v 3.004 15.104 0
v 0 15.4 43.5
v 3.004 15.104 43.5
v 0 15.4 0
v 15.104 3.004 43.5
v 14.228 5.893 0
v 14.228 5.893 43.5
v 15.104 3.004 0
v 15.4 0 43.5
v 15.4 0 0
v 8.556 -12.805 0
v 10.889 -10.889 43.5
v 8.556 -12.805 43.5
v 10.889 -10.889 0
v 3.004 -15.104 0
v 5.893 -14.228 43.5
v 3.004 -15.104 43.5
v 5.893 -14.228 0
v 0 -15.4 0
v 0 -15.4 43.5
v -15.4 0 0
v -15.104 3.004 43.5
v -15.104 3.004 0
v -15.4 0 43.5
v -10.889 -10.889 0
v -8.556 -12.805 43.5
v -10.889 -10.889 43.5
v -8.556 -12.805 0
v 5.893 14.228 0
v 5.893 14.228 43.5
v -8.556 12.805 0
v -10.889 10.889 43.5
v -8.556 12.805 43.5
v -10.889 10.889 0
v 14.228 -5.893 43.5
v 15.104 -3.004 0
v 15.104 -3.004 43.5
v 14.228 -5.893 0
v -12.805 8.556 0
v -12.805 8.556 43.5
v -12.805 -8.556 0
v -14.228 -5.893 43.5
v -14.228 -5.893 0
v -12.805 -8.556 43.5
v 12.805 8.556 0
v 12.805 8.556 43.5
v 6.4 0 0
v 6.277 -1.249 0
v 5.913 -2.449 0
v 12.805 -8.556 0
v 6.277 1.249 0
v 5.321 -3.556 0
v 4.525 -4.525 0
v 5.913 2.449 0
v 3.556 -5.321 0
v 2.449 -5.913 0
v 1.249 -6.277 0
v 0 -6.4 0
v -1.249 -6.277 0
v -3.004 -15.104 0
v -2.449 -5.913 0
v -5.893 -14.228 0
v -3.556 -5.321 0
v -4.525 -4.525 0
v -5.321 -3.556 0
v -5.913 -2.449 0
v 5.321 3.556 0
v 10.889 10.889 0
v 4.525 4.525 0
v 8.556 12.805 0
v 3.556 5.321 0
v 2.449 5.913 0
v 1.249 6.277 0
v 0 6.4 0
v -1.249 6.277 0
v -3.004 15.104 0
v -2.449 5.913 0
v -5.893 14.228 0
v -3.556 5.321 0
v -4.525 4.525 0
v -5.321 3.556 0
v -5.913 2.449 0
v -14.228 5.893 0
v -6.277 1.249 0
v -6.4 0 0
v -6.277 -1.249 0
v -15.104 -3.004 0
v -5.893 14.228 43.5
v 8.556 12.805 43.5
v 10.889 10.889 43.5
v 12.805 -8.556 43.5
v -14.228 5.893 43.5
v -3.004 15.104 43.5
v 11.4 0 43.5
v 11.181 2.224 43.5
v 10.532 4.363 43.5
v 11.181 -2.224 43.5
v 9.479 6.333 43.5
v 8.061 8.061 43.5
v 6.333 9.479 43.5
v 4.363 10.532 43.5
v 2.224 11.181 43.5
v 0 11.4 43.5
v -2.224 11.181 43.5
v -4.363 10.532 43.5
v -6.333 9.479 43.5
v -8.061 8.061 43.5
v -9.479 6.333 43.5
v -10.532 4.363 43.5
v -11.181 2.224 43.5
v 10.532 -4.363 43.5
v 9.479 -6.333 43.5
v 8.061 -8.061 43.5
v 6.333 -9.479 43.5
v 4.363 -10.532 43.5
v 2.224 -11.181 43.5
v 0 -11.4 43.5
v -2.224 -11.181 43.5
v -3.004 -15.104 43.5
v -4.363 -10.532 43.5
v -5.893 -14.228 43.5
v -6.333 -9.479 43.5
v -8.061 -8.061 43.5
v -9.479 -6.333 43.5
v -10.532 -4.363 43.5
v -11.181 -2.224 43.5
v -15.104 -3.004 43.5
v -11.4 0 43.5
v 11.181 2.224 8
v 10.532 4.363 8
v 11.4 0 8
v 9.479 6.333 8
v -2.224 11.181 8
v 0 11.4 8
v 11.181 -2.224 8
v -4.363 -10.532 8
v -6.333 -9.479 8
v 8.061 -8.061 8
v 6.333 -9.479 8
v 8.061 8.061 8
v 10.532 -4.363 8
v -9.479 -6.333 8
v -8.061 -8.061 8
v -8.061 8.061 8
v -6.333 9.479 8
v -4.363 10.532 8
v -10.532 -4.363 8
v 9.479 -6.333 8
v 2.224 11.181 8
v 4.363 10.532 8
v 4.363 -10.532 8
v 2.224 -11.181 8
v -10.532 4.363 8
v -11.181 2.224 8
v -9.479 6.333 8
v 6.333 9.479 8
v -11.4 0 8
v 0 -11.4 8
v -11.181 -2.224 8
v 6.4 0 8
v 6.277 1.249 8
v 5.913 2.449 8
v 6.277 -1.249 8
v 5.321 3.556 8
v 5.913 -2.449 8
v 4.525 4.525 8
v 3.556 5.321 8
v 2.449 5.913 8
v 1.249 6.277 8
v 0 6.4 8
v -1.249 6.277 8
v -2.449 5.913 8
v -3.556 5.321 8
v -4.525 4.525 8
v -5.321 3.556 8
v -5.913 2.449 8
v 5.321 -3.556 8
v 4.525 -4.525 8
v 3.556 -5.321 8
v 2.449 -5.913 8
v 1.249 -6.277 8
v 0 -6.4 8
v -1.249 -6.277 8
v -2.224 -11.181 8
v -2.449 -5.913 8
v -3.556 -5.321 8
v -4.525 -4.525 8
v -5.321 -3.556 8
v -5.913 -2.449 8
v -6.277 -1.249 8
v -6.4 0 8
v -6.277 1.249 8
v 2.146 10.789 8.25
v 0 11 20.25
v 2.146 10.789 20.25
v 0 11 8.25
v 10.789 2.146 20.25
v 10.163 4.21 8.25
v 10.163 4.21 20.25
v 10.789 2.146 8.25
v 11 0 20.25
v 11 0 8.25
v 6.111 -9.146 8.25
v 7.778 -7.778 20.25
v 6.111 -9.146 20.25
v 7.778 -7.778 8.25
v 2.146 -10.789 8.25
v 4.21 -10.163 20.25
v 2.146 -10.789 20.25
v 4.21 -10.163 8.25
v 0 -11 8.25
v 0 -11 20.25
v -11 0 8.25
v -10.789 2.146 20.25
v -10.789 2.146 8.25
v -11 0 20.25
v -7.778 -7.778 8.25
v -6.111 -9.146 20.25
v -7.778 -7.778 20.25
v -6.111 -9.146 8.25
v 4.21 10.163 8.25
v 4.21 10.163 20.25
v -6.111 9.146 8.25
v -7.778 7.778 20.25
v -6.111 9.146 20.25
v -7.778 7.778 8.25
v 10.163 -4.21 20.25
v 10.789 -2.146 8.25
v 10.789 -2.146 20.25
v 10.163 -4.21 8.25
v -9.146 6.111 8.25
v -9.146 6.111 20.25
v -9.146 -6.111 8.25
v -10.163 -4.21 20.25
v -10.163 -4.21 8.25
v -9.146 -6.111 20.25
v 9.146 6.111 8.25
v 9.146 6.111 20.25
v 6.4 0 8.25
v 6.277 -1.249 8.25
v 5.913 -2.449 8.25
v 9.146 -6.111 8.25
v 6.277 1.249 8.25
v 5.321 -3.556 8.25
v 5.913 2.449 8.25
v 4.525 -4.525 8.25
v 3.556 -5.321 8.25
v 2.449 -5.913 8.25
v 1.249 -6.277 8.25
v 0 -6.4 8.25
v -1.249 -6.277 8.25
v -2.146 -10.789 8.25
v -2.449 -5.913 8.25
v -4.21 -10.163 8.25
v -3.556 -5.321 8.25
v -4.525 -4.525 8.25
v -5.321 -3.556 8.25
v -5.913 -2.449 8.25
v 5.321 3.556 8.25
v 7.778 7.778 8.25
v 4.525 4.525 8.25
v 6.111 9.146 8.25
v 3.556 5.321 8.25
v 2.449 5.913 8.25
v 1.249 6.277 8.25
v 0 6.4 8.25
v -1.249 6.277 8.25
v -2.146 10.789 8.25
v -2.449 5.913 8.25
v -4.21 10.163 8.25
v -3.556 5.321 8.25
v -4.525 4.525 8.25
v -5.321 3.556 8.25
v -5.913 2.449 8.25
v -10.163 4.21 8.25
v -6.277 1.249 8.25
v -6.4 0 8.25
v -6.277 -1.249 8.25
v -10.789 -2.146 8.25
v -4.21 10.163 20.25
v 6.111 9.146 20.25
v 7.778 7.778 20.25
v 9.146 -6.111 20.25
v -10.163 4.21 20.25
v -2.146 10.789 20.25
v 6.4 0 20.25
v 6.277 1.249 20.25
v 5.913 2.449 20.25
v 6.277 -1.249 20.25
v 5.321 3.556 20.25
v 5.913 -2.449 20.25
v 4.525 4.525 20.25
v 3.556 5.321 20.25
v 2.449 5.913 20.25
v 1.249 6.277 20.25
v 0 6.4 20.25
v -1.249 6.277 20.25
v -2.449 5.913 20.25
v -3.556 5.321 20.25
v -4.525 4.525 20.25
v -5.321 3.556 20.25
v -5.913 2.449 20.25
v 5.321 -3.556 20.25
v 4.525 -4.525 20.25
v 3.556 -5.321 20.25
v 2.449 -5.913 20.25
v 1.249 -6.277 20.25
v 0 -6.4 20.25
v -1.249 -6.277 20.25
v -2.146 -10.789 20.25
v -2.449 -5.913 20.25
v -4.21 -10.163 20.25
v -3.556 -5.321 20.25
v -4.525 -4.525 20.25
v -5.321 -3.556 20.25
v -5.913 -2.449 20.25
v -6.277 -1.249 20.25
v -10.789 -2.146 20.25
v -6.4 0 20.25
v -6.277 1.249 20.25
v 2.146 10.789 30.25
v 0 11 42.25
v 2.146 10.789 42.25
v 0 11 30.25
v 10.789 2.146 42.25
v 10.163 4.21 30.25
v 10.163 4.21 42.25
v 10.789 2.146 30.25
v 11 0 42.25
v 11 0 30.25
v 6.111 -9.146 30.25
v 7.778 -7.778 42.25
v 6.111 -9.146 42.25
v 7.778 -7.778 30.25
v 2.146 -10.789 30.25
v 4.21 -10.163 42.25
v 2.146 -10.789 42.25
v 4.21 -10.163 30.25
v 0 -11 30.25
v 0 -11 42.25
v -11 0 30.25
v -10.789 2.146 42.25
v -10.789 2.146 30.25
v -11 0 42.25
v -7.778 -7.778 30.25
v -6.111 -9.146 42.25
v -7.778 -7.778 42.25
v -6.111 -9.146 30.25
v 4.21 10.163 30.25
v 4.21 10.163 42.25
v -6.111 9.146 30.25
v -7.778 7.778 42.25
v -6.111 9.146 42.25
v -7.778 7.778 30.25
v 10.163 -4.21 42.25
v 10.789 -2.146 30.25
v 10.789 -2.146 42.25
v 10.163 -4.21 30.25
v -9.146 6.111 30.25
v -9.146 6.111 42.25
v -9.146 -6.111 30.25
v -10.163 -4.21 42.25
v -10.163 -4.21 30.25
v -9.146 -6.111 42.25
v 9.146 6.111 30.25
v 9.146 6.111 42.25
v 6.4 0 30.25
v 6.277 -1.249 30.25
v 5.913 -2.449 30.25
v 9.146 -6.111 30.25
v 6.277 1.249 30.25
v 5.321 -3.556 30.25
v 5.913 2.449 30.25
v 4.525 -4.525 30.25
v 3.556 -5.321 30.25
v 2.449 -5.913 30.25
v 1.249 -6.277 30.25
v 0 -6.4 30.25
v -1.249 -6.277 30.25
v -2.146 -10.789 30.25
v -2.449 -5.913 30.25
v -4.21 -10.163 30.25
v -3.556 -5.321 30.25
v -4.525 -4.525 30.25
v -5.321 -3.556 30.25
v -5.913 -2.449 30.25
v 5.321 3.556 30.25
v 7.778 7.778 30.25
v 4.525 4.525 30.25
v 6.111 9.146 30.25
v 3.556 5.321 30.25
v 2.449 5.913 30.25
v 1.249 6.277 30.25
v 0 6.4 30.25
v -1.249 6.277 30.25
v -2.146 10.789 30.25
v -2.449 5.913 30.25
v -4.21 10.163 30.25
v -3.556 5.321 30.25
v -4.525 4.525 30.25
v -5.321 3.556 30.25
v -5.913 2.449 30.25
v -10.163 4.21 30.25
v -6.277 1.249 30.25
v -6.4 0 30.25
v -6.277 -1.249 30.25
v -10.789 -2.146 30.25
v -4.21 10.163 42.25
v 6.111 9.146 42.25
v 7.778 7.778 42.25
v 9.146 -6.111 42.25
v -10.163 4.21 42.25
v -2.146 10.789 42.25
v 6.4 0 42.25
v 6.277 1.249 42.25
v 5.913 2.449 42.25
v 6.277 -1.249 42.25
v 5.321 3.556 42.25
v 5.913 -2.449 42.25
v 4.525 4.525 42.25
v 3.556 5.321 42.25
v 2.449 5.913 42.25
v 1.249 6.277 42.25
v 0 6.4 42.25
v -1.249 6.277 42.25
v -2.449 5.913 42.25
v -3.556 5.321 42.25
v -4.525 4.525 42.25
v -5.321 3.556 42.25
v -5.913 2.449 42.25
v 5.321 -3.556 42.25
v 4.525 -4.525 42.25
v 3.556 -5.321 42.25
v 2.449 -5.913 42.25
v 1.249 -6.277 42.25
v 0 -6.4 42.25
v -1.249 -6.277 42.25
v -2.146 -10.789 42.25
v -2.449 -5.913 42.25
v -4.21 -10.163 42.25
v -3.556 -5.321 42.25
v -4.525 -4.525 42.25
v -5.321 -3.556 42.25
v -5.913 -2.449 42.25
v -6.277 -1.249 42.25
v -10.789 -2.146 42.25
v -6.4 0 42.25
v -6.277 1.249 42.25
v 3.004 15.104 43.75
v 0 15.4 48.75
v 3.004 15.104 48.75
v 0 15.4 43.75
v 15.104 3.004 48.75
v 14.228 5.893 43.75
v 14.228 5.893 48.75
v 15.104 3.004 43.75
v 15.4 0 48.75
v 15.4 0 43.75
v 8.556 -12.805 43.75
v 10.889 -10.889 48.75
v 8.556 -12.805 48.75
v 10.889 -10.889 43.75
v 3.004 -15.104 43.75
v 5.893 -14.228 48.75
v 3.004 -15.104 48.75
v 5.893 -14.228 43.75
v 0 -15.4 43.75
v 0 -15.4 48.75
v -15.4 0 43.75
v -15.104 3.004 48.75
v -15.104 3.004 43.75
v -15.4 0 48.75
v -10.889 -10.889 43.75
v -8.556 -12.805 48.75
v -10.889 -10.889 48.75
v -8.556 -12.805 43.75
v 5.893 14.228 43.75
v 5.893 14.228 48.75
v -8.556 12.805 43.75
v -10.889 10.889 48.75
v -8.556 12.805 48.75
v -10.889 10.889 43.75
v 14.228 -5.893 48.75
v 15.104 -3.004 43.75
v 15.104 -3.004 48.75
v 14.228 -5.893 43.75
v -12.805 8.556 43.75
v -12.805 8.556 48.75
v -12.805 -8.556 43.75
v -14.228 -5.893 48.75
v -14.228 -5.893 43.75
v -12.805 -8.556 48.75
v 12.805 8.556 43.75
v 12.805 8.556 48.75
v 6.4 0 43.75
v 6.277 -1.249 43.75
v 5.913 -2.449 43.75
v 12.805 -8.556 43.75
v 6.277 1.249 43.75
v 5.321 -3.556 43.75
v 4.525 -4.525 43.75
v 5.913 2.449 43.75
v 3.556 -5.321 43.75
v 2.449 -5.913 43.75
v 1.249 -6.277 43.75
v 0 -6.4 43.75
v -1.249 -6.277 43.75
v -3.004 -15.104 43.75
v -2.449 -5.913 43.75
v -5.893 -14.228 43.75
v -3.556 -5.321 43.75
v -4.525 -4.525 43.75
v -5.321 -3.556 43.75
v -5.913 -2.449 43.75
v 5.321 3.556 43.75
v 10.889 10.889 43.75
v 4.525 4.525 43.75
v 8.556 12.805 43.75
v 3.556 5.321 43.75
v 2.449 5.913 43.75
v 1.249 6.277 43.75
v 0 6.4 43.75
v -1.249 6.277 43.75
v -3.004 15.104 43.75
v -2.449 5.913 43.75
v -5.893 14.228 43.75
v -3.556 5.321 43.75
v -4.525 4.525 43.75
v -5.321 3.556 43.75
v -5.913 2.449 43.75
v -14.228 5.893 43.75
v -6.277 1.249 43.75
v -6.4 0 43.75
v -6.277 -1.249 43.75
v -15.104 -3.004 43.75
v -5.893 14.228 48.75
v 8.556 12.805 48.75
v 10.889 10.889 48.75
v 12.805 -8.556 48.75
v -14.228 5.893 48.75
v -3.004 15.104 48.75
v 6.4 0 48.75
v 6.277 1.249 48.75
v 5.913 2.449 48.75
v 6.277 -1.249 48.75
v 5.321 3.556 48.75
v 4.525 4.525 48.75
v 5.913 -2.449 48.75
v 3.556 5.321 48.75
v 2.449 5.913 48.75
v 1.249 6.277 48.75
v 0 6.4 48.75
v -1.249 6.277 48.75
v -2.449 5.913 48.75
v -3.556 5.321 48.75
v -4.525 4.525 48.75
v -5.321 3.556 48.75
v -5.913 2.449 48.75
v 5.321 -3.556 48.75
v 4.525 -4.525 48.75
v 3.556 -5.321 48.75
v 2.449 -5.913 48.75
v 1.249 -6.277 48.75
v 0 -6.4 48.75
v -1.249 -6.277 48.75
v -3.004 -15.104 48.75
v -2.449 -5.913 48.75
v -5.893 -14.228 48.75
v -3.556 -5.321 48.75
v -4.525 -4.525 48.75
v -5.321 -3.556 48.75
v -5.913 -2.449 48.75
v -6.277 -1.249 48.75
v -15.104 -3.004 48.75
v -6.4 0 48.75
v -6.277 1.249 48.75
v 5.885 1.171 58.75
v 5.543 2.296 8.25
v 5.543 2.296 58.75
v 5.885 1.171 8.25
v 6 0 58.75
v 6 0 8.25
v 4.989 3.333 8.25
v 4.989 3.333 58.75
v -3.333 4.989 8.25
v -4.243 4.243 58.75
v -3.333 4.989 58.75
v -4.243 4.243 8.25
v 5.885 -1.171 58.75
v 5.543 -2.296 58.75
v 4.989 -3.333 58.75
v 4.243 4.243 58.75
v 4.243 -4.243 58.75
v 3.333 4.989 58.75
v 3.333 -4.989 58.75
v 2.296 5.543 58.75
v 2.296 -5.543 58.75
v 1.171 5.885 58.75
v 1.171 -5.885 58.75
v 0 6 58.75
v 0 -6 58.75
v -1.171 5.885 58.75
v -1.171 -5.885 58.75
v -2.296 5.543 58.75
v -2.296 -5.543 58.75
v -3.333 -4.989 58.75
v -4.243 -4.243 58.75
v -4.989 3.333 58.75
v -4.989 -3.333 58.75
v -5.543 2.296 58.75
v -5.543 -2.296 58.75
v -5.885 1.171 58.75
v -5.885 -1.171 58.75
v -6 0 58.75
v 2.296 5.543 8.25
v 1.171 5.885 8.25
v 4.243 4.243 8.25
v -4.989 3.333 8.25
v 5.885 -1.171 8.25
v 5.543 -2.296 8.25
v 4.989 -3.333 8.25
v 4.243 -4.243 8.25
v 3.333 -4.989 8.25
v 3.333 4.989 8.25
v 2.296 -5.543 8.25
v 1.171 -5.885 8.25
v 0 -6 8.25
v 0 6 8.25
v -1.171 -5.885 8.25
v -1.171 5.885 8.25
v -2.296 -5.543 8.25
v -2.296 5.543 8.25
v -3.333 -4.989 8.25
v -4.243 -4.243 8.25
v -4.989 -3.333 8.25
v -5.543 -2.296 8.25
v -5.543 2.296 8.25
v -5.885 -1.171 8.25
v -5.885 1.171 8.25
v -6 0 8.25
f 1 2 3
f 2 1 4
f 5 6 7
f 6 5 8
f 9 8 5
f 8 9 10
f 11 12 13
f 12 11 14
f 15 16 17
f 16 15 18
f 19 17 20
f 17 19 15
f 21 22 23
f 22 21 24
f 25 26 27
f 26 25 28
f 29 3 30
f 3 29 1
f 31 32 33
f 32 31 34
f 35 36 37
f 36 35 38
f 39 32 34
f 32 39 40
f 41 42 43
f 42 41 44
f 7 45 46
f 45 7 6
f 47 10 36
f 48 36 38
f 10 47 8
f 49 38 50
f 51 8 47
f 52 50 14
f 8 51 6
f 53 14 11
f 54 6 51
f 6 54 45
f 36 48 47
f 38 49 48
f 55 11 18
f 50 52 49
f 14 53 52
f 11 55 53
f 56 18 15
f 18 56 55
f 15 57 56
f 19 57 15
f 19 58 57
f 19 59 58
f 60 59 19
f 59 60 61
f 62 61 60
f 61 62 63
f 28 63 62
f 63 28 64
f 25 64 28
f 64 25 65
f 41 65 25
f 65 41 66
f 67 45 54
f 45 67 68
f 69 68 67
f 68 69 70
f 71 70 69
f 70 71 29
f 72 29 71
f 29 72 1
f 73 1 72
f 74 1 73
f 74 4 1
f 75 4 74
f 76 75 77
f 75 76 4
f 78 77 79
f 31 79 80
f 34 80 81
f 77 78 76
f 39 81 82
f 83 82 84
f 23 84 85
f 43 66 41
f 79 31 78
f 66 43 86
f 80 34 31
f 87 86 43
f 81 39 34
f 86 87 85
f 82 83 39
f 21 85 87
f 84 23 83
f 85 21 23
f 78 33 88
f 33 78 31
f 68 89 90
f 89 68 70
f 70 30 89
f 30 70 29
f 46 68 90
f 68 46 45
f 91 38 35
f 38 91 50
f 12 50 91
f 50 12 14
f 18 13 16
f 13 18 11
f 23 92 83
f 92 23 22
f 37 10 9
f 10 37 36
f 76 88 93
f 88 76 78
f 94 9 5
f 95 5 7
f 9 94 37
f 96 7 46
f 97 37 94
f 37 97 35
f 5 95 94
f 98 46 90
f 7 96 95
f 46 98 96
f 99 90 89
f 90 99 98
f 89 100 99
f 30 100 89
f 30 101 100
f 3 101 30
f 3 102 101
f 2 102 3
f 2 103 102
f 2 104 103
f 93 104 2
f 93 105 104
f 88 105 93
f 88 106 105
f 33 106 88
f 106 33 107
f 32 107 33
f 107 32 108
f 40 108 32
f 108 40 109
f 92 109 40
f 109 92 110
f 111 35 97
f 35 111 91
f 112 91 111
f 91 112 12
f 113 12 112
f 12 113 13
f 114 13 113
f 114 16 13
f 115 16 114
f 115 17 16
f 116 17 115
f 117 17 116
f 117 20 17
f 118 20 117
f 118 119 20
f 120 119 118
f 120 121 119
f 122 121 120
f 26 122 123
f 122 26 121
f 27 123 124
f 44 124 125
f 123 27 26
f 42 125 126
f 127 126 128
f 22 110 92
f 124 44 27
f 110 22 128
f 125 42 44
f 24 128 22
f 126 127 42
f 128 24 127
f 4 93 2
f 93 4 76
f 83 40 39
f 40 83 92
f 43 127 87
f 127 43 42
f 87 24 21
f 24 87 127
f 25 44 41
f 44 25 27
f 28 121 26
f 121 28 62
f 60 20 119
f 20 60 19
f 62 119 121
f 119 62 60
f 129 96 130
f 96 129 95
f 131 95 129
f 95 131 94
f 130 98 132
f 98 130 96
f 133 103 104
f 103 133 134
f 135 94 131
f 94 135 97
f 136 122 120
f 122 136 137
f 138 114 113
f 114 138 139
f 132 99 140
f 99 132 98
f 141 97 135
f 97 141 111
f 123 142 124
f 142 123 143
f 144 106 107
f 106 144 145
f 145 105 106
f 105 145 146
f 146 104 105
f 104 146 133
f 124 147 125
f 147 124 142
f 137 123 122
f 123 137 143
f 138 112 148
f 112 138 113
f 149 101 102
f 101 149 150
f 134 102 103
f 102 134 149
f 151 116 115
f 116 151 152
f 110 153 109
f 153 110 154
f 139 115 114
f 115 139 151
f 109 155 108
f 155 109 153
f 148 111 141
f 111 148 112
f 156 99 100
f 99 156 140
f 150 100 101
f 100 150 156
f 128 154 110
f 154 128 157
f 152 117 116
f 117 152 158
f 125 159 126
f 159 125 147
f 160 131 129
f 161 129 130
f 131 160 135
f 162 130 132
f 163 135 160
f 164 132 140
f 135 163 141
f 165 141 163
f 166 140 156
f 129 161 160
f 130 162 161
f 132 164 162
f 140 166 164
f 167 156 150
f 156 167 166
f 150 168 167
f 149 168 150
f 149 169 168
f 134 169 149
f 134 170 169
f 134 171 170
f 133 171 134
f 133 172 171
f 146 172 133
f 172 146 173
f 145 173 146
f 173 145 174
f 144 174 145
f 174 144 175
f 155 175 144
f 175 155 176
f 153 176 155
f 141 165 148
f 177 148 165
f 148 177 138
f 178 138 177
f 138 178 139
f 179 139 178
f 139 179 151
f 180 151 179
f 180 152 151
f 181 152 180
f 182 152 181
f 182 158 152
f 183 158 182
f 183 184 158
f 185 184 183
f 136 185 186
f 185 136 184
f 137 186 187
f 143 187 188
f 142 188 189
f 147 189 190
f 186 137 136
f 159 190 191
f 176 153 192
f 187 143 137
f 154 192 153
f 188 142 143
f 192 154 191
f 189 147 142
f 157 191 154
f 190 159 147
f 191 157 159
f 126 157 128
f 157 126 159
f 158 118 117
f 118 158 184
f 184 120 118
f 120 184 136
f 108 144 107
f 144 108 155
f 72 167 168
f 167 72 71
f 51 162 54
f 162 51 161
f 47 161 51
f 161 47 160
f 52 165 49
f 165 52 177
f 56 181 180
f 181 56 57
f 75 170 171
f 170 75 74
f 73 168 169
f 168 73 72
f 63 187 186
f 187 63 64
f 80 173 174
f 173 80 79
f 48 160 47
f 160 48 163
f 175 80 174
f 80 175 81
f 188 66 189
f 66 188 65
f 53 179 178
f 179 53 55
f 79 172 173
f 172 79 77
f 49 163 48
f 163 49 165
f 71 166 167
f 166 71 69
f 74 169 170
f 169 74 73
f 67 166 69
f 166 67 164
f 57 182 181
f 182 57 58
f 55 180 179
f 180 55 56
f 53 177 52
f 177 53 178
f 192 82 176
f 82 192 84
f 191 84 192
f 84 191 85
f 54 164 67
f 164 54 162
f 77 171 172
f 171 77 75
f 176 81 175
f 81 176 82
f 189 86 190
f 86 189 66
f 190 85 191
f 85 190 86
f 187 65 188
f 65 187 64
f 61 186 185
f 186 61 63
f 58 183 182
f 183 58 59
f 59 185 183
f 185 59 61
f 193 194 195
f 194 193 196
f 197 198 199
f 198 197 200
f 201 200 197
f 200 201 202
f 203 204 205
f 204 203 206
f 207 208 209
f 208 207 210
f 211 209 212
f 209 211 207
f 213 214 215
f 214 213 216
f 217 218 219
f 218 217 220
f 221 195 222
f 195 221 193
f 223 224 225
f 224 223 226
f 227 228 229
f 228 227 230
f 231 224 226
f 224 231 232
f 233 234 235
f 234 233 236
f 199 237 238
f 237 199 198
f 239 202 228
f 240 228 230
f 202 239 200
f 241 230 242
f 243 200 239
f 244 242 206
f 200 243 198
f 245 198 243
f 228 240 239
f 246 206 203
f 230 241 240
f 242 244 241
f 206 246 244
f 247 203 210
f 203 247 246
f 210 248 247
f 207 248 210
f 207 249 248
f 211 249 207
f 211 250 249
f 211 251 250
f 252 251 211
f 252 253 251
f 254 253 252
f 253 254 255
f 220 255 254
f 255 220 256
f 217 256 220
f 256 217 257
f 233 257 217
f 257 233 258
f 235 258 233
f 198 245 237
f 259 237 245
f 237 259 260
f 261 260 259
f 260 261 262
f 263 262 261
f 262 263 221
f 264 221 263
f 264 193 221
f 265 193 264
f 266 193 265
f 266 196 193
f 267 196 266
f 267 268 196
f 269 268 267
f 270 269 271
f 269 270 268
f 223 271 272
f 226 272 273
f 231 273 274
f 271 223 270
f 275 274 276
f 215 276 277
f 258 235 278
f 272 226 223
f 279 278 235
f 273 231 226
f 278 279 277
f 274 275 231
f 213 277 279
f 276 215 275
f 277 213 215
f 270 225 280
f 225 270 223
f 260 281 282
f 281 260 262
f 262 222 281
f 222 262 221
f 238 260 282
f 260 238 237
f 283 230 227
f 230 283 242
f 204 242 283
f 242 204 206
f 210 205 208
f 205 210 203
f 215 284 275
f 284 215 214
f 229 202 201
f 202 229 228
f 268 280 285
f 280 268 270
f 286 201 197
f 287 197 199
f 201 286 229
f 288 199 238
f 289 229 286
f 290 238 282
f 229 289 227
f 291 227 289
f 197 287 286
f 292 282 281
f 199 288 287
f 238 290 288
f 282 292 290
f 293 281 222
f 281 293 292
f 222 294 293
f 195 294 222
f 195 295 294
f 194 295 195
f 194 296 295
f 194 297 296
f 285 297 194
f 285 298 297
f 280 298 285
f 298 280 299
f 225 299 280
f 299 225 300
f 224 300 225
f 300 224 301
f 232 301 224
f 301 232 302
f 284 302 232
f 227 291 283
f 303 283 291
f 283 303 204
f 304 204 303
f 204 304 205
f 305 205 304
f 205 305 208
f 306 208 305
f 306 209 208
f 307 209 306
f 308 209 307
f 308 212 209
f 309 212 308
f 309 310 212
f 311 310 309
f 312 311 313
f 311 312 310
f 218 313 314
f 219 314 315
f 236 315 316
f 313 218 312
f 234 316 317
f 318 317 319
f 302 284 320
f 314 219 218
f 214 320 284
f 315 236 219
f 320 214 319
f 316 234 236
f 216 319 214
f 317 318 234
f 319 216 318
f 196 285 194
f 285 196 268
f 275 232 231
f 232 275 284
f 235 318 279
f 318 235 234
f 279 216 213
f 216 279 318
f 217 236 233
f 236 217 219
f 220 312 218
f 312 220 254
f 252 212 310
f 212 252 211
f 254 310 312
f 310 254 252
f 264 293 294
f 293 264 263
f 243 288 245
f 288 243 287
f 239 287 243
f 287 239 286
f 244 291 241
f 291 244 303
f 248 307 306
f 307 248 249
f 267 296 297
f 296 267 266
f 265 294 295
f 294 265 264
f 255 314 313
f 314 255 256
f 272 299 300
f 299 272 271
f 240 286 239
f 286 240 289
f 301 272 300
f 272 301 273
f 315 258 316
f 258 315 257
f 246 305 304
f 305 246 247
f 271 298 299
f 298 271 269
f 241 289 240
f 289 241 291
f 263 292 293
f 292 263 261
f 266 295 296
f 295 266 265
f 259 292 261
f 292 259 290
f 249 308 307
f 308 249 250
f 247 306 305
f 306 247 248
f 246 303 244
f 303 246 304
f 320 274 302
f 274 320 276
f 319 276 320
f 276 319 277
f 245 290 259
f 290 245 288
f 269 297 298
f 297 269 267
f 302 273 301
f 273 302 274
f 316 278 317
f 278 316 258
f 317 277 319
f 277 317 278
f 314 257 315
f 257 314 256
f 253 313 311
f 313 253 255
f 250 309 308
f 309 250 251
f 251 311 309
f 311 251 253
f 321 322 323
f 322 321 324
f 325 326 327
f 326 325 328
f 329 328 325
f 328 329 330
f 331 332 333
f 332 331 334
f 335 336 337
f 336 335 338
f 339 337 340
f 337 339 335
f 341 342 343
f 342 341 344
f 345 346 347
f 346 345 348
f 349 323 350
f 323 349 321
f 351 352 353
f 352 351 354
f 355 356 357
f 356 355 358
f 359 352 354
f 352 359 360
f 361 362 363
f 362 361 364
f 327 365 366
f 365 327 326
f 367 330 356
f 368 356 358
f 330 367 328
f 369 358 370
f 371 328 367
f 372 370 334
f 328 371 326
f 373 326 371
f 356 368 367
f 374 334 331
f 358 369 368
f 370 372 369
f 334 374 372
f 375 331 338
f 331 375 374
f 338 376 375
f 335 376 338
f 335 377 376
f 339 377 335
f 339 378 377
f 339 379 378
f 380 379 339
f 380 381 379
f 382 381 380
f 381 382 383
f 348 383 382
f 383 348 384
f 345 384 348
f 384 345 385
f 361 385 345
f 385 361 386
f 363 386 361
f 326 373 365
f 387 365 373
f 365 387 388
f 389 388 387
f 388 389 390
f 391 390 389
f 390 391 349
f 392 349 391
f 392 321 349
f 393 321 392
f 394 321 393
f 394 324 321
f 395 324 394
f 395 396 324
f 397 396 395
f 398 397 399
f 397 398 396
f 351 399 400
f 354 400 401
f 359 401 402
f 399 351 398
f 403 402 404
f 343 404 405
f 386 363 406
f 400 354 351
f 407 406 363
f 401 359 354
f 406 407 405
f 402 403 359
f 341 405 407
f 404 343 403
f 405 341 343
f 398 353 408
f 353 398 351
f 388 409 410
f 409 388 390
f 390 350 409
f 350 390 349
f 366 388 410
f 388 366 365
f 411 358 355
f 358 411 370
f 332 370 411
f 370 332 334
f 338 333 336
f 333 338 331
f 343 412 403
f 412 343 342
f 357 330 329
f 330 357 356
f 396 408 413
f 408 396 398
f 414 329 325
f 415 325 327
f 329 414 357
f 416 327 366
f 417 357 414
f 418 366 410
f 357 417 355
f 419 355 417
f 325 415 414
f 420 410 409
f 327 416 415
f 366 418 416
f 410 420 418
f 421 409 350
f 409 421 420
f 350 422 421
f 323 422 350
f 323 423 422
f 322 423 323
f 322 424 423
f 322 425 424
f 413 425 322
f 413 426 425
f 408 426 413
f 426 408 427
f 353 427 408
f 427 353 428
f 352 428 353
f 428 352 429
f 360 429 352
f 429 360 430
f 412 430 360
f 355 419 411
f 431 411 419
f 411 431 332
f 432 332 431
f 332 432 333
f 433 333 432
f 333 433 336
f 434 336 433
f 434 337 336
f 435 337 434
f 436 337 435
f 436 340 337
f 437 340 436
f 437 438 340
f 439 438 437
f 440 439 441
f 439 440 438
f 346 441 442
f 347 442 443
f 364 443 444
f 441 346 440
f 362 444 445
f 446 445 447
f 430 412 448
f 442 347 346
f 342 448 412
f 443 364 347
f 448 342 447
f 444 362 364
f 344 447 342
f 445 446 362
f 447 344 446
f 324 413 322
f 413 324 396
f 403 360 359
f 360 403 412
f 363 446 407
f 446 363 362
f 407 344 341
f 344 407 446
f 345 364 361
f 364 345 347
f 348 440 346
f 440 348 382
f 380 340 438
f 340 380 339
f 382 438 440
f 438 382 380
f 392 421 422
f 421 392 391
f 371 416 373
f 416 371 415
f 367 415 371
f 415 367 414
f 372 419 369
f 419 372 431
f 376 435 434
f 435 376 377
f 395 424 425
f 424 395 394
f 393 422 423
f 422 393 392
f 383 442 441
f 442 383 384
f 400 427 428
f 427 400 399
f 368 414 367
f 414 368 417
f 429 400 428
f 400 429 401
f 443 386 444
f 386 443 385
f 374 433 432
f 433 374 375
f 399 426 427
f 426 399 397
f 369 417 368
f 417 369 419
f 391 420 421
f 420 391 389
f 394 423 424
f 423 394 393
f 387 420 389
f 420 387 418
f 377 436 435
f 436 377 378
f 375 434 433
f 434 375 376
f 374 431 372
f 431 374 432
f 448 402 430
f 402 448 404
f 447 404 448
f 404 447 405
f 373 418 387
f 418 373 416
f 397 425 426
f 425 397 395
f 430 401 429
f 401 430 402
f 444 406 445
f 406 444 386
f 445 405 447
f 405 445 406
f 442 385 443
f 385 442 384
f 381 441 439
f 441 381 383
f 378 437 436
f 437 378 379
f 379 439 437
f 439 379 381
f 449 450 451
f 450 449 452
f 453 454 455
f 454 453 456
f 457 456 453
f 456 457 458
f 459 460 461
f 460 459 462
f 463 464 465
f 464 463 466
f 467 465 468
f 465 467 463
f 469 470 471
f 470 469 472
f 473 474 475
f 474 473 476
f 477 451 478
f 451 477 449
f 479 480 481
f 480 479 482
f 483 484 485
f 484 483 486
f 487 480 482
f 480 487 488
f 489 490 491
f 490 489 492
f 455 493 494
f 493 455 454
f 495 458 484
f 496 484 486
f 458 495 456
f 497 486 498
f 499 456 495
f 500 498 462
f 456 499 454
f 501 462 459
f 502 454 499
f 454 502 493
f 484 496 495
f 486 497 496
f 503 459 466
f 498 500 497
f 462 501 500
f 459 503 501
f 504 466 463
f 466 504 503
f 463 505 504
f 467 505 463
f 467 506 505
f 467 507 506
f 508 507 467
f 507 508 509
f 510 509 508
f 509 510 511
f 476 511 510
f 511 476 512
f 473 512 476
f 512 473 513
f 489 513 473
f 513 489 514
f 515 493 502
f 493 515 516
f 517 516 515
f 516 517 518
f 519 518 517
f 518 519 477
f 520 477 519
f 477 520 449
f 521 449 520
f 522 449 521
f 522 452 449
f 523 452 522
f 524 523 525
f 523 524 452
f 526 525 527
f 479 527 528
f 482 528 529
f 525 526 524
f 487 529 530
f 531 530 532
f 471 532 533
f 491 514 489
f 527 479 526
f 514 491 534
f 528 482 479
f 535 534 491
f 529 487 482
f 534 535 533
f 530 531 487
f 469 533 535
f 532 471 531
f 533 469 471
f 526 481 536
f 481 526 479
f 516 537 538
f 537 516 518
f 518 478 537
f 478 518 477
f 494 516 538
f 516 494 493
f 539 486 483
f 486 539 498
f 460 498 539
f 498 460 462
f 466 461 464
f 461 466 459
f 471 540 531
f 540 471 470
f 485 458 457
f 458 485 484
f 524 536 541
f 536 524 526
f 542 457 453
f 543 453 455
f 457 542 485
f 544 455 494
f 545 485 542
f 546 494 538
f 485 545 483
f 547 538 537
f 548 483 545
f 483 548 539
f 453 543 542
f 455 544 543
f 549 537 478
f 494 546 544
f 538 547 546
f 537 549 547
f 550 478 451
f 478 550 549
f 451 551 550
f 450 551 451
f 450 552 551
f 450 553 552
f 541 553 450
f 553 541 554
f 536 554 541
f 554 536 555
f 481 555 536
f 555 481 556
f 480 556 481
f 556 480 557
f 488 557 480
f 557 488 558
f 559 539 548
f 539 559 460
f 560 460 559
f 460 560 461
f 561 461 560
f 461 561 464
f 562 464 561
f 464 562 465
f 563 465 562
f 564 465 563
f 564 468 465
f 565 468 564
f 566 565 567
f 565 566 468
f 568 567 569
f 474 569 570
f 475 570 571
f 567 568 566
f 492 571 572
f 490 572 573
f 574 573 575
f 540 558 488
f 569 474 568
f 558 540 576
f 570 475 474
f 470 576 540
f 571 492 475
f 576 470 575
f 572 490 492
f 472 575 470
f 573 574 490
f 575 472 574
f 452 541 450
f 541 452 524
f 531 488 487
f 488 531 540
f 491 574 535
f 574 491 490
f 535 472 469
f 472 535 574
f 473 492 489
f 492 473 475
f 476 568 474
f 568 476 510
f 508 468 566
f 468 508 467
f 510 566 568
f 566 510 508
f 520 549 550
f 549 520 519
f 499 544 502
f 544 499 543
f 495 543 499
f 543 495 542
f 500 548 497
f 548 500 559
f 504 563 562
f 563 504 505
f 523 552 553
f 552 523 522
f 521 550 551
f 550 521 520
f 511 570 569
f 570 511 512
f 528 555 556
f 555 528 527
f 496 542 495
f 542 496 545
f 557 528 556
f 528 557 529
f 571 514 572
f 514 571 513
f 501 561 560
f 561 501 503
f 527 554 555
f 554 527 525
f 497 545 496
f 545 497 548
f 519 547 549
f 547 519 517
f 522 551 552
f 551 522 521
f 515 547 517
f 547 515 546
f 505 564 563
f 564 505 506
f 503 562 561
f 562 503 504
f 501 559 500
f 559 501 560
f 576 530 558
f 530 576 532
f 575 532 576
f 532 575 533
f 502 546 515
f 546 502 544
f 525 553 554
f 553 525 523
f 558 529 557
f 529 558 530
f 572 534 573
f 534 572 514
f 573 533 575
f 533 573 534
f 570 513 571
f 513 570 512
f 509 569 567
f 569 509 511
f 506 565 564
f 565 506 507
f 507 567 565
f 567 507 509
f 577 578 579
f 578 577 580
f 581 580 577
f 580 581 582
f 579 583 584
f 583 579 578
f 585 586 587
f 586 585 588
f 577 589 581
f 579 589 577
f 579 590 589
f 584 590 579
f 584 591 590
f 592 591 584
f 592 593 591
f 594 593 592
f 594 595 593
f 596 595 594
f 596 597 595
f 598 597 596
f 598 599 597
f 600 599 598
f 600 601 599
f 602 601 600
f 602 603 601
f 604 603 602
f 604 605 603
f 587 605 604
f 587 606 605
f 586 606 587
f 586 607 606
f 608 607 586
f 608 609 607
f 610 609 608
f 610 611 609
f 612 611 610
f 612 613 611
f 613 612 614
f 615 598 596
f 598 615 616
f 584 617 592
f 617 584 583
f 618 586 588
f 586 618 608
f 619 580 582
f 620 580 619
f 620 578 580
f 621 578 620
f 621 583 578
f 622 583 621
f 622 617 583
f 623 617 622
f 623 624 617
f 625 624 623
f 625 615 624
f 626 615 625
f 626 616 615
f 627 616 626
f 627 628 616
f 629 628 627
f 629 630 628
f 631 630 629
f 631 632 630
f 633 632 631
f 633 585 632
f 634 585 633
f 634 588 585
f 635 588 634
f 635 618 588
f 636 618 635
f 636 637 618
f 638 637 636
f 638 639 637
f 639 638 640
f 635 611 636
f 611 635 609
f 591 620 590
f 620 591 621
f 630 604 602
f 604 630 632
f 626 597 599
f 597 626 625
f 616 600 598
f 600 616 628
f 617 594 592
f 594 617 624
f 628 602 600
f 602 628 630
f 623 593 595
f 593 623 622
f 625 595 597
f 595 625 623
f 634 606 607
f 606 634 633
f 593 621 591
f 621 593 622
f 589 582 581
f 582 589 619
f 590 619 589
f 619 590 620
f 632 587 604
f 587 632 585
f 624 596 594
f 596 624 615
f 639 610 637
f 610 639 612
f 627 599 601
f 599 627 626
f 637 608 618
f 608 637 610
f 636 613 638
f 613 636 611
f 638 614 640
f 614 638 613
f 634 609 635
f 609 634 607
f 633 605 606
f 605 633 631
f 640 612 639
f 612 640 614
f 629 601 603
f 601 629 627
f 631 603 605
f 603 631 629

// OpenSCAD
$fn = 32;

// ------------------------------------------------------------------------
// Shaft station: cup d30.8 x 43.5 mm, shaft d12
// Every part is its own module, assembly() places every instance.
// ------------------------------------------------------------------------

// --- part 1 ---
module housing_cup() {
  difference() {
    cylinder(h = 43.5, d = 30.8);
    translate([0, 0, 8]) cylinder(h = 36.5, d = 22.8);
    translate([0, 0, -1]) cylinder(h = 10, d = 12.8);
  }
}

// --- part 2 ---
module bearing_lower() {
  difference() {
      translate([0, 0, 0]) cylinder(h = 12, d = 22);
      translate([0, 0, -1]) cylinder(h = 14, d = 12.8);
    }
}

// --- part 3 ---
module bearing_upper() {
  difference() {
      translate([0, 0, 0]) cylinder(h = 12, d = 22);
      translate([0, 0, -1]) cylinder(h = 14, d = 12.8);
    }
}

// --- part 4 ---
module station_shaft() {
  translate([0, 0, -25.25]) cylinder(h = 50.5, d = 12);
}

// --- part 5 ---
module station_cover() {
  difference() {
    cylinder(h = 5, d = 30.8);
    translate([0, 0, -1]) cylinder(h = 7, d = 12.8);
  }
}

// --- assembly ---
module assembly() {
  color([0.80, 0.24, 0.20]) translate([0, 0, 0]) rotate([0, 0, 0]) housing_cup();
  color([0.20, 0.45, 0.75]) translate([0, 0, 8.25]) rotate([0, 0, 0]) bearing_lower();
  color([0.25, 0.62, 0.32]) translate([0, 0, 30.25]) rotate([0, 0, 0]) bearing_upper();
  color([0.92, 0.70, 0.18]) translate([0, 0, 33.5]) rotate([0, 0, 0]) station_shaft();
  color([0.58, 0.35, 0.70]) translate([0, 0, 43.75]) rotate([0, 0, 0]) station_cover();
}

assembly();
